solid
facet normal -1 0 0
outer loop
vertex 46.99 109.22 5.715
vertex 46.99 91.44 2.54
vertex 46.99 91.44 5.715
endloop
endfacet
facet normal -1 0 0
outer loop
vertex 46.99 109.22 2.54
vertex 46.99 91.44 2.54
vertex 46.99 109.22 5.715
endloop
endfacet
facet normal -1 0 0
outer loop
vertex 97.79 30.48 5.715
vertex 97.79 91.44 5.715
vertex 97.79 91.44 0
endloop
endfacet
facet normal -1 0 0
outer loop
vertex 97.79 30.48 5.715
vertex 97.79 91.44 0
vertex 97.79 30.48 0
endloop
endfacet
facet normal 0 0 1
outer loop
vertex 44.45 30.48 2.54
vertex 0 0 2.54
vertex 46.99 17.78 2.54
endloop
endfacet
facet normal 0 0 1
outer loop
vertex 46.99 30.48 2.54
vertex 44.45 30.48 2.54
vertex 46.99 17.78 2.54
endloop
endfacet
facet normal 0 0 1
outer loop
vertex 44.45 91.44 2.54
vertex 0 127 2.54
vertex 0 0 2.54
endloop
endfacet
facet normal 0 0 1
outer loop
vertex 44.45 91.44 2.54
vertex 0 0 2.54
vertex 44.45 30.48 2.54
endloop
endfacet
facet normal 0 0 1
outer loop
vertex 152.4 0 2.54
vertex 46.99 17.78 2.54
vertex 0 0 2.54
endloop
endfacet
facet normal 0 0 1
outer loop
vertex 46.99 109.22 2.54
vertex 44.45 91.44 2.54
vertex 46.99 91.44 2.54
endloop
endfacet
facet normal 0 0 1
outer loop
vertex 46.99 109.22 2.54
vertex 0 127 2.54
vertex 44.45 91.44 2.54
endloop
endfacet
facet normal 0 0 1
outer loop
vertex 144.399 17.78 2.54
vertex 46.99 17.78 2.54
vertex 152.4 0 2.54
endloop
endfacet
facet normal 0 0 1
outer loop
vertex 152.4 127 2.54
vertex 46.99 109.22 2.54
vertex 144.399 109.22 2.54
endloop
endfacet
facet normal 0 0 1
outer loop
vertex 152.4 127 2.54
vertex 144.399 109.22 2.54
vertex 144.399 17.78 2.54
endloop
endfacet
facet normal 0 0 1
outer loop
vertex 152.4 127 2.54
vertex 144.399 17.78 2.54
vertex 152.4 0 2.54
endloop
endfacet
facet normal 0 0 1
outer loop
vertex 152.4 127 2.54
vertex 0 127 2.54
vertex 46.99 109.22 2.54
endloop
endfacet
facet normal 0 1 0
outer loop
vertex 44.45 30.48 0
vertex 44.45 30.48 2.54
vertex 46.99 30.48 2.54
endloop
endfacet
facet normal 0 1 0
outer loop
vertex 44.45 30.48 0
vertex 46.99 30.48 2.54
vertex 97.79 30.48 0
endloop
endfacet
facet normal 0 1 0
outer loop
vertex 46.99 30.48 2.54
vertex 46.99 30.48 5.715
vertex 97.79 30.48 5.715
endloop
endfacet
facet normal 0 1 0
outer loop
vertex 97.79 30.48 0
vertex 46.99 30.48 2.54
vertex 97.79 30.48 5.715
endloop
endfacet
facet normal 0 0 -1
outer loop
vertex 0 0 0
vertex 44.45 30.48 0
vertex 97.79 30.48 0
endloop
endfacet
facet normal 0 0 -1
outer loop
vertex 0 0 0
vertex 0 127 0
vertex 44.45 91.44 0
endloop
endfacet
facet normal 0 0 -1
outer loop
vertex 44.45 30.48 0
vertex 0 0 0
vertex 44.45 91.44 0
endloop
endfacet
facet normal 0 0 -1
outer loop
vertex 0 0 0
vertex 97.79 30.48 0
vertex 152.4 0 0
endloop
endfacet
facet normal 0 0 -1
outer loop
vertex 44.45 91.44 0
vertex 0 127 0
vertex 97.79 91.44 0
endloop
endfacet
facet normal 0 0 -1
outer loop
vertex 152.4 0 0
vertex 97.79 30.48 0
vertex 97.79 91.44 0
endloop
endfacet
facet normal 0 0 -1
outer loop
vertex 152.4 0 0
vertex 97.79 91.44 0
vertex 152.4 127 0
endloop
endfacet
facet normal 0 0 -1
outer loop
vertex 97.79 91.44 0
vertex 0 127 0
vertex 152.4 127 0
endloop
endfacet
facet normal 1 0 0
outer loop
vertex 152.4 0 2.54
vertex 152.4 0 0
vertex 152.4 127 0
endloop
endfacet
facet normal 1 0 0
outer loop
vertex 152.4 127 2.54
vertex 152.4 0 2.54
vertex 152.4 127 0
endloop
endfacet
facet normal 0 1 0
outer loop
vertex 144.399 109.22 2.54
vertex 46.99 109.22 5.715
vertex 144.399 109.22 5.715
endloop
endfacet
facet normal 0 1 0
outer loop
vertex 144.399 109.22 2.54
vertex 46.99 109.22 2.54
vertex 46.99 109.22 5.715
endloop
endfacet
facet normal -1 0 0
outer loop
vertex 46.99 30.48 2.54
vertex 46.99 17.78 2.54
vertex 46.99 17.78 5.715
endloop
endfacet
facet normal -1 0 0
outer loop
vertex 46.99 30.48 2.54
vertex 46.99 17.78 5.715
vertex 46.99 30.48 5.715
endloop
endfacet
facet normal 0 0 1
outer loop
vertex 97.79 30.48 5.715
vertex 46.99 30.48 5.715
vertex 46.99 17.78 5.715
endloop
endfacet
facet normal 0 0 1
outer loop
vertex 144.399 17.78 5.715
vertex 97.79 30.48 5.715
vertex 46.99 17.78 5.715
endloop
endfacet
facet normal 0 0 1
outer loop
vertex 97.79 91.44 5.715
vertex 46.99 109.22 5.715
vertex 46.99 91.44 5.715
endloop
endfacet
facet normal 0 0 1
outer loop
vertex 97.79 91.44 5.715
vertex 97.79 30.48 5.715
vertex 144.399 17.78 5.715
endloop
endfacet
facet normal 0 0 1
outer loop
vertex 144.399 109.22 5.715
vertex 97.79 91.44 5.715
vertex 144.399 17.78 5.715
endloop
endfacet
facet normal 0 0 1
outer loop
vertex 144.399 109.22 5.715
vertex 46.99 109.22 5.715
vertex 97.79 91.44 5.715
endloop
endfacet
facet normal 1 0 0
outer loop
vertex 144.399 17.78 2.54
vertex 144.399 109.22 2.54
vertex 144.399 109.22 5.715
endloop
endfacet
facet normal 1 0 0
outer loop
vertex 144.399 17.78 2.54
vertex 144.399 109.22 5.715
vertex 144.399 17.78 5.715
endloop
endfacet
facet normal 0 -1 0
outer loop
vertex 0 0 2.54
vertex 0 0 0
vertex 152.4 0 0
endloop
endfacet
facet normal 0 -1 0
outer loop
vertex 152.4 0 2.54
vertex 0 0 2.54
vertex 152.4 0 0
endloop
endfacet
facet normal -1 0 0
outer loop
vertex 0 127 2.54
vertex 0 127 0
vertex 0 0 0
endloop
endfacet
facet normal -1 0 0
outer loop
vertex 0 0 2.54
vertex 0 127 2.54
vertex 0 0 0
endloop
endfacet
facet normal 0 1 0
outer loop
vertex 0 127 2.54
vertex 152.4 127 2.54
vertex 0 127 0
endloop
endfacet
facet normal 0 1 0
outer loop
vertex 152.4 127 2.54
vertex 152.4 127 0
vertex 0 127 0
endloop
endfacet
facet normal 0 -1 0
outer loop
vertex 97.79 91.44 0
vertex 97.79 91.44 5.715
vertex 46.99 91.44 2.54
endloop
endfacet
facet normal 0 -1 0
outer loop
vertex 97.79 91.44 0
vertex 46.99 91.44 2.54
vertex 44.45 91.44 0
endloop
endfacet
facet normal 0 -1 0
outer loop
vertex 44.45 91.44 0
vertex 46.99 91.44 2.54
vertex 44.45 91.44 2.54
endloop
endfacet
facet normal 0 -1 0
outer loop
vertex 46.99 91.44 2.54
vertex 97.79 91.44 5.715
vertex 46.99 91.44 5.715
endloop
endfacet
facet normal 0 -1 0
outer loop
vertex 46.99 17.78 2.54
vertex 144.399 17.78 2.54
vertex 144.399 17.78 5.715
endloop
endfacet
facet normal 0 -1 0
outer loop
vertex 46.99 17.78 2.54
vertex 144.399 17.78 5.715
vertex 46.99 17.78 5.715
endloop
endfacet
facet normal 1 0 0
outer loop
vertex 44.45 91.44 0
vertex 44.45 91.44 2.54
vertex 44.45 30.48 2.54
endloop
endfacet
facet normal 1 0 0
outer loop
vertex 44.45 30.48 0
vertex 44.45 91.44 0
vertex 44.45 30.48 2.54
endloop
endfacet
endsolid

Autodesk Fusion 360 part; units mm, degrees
sketch "Sketch1" plane through (0, 0, 0) normal (0, 0, 1) x (1, 0, 0)
  line L0 (0, 0) -> (152.4, 0)
  line L1 (152.4, 0) -> (152.4, 127)
  line L2 (152.4, 127) -> (0, 127)
  line L3 (0, 127) -> (0, 0)
  line L4 (46.99, 109.22) -> (144.399, 109.22)
  line L5 (144.399, 109.22) -> (144.399, 17.78)
  line L6 (144.399, 17.78) -> (46.99, 17.78)
  line L7 (46.99, 17.78) -> (46.99, 109.22)
  dimension "d1" = 152.4
  dimension "d2" = 127
  dimension "d3" = 97.409
  dimension "d4" = 91.44
  dimension "d5" = 46.99
  dimension "d6" = 17.78
extrude "Extrude1" add sketch "Sketch1" along normal blind 2.54 contours L0 L1 L2 L3 | L4 L5 L6 L7
extrude "Extrude2" add sketch "Sketch1" along normal blind 5.715 contours L4 L5 L6 L7
sketch "Sketch2" plane through (0, 0, 5.715) normal (0, 0, 1) x (-1, 0, 0)
  line L0 (-46.99, -17.78) -> (-144.399, -17.78)
  line L1 (-144.399, -17.78) -> (-144.399, -109.22)
  line L2 (-144.399, -109.22) -> (-46.99, -109.22)
  line L3 (-46.99, -109.22) -> (-46.99, -17.78)
  line L4 (-46.99, -91.44) -> (-97.79, -91.44)
  line L5 (-97.79, -91.44) -> (-97.79, -30.48)
  line L6 (-97.79, -30.48) -> (-46.99, -30.48)
  line L7 (-46.99, -25.4) -> (-46.99, -30.48)
  line L8 (-46.99, -91.44) -> (-44.45, -91.44)
  line L9 (-44.45, -91.44) -> (-44.45, -30.48)
  line L10 (-44.45, -30.48) -> (-46.99, -30.48)
  line L11 (-46.99, -30.48) -> (-46.99, -91.44)
  dimension "d11" = 60.96
  dimension "d12" = 17.78
  dimension "d15" = 50.8
  dimension "d19" = 2.54
  dimension "d20" = 60.96
extrude "Extrude3" cut sketch "Sketch2" against normal blind 38.1 contours L3 L4 L5 L6 L11
extrude "Extrude4" cut sketch "Sketch2" against normal blind 60.96 contours L3 L8 L9 L10 L11
